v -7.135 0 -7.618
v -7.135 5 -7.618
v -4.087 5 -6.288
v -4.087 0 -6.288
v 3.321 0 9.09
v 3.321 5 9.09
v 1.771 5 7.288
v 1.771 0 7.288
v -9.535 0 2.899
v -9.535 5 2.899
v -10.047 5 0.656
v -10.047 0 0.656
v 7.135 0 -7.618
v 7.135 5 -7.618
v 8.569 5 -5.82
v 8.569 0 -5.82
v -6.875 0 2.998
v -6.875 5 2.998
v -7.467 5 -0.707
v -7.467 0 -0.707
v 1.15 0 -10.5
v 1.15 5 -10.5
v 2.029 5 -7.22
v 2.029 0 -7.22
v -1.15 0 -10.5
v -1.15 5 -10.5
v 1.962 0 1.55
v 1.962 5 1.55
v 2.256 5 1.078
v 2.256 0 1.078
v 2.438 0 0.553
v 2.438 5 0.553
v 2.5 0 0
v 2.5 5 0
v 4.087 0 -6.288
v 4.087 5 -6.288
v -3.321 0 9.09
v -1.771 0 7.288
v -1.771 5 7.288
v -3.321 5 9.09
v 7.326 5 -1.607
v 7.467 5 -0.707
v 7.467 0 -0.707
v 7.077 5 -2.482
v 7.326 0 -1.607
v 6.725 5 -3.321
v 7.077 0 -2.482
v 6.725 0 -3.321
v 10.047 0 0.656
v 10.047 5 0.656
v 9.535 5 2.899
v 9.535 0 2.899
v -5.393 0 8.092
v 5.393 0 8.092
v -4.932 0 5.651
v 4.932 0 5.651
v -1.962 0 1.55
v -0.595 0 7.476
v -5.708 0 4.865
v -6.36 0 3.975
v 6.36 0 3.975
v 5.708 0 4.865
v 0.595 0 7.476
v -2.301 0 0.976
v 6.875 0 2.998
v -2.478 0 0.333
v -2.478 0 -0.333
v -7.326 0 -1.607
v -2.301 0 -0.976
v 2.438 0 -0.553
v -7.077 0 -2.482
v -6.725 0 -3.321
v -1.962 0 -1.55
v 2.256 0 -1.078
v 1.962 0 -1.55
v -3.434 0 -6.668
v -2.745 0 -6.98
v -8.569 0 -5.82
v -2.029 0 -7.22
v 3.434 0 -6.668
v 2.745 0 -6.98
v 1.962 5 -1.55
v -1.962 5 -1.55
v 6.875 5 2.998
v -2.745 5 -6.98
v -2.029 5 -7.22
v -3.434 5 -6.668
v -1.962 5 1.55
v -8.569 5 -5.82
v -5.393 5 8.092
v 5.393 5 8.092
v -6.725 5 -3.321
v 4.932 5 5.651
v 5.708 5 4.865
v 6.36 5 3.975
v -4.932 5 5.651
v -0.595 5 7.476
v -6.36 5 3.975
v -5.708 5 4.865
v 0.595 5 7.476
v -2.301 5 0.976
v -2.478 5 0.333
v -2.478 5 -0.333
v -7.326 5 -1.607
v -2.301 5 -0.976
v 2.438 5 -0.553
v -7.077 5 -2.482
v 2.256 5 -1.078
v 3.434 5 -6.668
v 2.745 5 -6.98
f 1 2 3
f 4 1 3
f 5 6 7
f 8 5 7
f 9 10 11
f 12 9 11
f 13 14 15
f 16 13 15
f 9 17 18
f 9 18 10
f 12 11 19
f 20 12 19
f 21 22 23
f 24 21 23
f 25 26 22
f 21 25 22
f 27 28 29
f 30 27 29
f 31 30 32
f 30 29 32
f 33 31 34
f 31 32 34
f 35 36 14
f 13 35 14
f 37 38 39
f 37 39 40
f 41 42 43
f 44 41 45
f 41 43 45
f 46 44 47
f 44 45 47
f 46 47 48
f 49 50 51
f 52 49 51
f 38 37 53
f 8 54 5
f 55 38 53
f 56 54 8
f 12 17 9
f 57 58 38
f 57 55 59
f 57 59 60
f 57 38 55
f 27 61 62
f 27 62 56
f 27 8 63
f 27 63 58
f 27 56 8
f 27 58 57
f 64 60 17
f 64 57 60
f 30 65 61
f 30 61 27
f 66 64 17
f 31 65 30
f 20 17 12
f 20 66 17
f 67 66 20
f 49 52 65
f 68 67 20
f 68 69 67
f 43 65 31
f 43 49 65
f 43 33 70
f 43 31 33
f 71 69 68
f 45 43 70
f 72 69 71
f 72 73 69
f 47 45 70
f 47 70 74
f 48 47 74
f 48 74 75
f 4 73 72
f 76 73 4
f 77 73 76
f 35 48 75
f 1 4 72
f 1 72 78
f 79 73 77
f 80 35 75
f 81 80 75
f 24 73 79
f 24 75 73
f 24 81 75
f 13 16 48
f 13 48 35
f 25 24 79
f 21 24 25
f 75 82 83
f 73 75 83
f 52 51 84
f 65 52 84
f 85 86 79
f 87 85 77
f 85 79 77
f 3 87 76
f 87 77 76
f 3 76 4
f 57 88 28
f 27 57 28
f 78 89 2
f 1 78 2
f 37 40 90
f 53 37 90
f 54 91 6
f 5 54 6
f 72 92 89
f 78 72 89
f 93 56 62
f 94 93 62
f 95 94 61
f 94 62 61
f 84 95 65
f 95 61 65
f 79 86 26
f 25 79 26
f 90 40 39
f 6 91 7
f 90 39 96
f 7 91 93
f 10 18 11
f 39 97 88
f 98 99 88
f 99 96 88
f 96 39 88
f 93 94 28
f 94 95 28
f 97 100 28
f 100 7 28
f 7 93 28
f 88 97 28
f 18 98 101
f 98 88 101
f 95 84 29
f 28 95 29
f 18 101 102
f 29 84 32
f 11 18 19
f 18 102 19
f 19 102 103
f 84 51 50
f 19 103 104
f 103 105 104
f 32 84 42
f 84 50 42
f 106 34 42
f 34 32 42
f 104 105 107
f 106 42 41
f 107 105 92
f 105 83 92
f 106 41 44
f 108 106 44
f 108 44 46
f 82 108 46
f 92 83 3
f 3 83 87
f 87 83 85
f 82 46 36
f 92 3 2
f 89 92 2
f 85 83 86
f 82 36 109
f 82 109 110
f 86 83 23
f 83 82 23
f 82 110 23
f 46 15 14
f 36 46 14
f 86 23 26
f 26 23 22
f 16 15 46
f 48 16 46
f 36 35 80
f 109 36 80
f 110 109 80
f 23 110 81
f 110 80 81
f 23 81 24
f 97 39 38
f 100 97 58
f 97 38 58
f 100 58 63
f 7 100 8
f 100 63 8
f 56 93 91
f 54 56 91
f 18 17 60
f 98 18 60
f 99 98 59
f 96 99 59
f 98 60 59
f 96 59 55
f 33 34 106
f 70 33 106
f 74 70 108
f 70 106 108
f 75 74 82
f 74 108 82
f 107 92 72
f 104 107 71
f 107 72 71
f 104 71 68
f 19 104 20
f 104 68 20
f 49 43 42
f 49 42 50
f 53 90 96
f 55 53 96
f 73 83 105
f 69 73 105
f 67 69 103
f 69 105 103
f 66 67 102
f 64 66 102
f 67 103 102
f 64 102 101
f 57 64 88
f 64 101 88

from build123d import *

# Parameters (mm, degrees)
SKIZZE1_R                       = 7.5
AUFSATZ_LINEAR_AUSTRAGEN1_DEPTH = 5
AUFSATZ_LINEAR_AUSTRAGEN2_DEPTH = 5
KREISMUSTER1_COUNT              = 7
SCHNITT_LINEAR_AUSTRAGEN1_DEPTH = 5


with BuildPart() as part:
    # Skizze1 → Aufsatz-Linear austragen1 (new body)
    with BuildSketch(Plane(origin=(0, 0, 0), x_dir=(1, 0, 0), z_dir=(0, 1, 0))):
        with Locations(Location((0, 0, 0), (0, 0, 270))):
            Circle(SKIZZE1_R)
    extrude(amount=AUFSATZ_LINEAR_AUSTRAGEN1_DEPTH)

    # Skizze2 → Aufsatz-Linear austragen2 (add)
    with BuildSketch(Plane(origin=(0, 5, 0), x_dir=(1, 0, 0), z_dir=(0, 1, 0))):
        Polygon((-1.15, 10.5), (1.15, 10.5), (2.087822174, 7), (-2.087822174, 7), align=None)
    aufsatz_linear_austragen2 = extrude(amount=-AUFSATZ_LINEAR_AUSTRAGEN2_DEPTH)

    # Kreismuster1: Aufsatz-Linear austragen2 ×7 about axis
    kreismuster1_axis = Axis((0, 0, -0.45727081), (0, 1, 0))
    for i in range(1, KREISMUSTER1_COUNT):
        add(aufsatz_linear_austragen2.rotate(kreismuster1_axis, i * 360 / KREISMUSTER1_COUNT))

    # Skizze3 → Schnitt-Linear austragen1 (cut)
    with BuildSketch(Plane(origin=(0, 5, 0), x_dir=(1, 0, 0), z_dir=(0, 1, 0))):
        with BuildLine():
            Line((1.961504525, 1.55), (-1.961504525, 1.55))
            ThreePointArc((-1.961504525, 1.55), (-2.5, 0), (-1.961504525, -1.55))
            Line((-1.961504525, -1.55), (1.961504525, -1.55))
            ThreePointArc((1.961504525, -1.55), (2.361542008, -0.820438507), (2.5, 0))
            ThreePointArc((2.5, 0), (2.361542008, 0.820438507), (1.961504525, 1.55))
        make_face()
    extrude(amount=-SCHNITT_LINEAR_AUSTRAGEN1_DEPTH, mode=Mode.SUBTRACT)


solid = part.part
